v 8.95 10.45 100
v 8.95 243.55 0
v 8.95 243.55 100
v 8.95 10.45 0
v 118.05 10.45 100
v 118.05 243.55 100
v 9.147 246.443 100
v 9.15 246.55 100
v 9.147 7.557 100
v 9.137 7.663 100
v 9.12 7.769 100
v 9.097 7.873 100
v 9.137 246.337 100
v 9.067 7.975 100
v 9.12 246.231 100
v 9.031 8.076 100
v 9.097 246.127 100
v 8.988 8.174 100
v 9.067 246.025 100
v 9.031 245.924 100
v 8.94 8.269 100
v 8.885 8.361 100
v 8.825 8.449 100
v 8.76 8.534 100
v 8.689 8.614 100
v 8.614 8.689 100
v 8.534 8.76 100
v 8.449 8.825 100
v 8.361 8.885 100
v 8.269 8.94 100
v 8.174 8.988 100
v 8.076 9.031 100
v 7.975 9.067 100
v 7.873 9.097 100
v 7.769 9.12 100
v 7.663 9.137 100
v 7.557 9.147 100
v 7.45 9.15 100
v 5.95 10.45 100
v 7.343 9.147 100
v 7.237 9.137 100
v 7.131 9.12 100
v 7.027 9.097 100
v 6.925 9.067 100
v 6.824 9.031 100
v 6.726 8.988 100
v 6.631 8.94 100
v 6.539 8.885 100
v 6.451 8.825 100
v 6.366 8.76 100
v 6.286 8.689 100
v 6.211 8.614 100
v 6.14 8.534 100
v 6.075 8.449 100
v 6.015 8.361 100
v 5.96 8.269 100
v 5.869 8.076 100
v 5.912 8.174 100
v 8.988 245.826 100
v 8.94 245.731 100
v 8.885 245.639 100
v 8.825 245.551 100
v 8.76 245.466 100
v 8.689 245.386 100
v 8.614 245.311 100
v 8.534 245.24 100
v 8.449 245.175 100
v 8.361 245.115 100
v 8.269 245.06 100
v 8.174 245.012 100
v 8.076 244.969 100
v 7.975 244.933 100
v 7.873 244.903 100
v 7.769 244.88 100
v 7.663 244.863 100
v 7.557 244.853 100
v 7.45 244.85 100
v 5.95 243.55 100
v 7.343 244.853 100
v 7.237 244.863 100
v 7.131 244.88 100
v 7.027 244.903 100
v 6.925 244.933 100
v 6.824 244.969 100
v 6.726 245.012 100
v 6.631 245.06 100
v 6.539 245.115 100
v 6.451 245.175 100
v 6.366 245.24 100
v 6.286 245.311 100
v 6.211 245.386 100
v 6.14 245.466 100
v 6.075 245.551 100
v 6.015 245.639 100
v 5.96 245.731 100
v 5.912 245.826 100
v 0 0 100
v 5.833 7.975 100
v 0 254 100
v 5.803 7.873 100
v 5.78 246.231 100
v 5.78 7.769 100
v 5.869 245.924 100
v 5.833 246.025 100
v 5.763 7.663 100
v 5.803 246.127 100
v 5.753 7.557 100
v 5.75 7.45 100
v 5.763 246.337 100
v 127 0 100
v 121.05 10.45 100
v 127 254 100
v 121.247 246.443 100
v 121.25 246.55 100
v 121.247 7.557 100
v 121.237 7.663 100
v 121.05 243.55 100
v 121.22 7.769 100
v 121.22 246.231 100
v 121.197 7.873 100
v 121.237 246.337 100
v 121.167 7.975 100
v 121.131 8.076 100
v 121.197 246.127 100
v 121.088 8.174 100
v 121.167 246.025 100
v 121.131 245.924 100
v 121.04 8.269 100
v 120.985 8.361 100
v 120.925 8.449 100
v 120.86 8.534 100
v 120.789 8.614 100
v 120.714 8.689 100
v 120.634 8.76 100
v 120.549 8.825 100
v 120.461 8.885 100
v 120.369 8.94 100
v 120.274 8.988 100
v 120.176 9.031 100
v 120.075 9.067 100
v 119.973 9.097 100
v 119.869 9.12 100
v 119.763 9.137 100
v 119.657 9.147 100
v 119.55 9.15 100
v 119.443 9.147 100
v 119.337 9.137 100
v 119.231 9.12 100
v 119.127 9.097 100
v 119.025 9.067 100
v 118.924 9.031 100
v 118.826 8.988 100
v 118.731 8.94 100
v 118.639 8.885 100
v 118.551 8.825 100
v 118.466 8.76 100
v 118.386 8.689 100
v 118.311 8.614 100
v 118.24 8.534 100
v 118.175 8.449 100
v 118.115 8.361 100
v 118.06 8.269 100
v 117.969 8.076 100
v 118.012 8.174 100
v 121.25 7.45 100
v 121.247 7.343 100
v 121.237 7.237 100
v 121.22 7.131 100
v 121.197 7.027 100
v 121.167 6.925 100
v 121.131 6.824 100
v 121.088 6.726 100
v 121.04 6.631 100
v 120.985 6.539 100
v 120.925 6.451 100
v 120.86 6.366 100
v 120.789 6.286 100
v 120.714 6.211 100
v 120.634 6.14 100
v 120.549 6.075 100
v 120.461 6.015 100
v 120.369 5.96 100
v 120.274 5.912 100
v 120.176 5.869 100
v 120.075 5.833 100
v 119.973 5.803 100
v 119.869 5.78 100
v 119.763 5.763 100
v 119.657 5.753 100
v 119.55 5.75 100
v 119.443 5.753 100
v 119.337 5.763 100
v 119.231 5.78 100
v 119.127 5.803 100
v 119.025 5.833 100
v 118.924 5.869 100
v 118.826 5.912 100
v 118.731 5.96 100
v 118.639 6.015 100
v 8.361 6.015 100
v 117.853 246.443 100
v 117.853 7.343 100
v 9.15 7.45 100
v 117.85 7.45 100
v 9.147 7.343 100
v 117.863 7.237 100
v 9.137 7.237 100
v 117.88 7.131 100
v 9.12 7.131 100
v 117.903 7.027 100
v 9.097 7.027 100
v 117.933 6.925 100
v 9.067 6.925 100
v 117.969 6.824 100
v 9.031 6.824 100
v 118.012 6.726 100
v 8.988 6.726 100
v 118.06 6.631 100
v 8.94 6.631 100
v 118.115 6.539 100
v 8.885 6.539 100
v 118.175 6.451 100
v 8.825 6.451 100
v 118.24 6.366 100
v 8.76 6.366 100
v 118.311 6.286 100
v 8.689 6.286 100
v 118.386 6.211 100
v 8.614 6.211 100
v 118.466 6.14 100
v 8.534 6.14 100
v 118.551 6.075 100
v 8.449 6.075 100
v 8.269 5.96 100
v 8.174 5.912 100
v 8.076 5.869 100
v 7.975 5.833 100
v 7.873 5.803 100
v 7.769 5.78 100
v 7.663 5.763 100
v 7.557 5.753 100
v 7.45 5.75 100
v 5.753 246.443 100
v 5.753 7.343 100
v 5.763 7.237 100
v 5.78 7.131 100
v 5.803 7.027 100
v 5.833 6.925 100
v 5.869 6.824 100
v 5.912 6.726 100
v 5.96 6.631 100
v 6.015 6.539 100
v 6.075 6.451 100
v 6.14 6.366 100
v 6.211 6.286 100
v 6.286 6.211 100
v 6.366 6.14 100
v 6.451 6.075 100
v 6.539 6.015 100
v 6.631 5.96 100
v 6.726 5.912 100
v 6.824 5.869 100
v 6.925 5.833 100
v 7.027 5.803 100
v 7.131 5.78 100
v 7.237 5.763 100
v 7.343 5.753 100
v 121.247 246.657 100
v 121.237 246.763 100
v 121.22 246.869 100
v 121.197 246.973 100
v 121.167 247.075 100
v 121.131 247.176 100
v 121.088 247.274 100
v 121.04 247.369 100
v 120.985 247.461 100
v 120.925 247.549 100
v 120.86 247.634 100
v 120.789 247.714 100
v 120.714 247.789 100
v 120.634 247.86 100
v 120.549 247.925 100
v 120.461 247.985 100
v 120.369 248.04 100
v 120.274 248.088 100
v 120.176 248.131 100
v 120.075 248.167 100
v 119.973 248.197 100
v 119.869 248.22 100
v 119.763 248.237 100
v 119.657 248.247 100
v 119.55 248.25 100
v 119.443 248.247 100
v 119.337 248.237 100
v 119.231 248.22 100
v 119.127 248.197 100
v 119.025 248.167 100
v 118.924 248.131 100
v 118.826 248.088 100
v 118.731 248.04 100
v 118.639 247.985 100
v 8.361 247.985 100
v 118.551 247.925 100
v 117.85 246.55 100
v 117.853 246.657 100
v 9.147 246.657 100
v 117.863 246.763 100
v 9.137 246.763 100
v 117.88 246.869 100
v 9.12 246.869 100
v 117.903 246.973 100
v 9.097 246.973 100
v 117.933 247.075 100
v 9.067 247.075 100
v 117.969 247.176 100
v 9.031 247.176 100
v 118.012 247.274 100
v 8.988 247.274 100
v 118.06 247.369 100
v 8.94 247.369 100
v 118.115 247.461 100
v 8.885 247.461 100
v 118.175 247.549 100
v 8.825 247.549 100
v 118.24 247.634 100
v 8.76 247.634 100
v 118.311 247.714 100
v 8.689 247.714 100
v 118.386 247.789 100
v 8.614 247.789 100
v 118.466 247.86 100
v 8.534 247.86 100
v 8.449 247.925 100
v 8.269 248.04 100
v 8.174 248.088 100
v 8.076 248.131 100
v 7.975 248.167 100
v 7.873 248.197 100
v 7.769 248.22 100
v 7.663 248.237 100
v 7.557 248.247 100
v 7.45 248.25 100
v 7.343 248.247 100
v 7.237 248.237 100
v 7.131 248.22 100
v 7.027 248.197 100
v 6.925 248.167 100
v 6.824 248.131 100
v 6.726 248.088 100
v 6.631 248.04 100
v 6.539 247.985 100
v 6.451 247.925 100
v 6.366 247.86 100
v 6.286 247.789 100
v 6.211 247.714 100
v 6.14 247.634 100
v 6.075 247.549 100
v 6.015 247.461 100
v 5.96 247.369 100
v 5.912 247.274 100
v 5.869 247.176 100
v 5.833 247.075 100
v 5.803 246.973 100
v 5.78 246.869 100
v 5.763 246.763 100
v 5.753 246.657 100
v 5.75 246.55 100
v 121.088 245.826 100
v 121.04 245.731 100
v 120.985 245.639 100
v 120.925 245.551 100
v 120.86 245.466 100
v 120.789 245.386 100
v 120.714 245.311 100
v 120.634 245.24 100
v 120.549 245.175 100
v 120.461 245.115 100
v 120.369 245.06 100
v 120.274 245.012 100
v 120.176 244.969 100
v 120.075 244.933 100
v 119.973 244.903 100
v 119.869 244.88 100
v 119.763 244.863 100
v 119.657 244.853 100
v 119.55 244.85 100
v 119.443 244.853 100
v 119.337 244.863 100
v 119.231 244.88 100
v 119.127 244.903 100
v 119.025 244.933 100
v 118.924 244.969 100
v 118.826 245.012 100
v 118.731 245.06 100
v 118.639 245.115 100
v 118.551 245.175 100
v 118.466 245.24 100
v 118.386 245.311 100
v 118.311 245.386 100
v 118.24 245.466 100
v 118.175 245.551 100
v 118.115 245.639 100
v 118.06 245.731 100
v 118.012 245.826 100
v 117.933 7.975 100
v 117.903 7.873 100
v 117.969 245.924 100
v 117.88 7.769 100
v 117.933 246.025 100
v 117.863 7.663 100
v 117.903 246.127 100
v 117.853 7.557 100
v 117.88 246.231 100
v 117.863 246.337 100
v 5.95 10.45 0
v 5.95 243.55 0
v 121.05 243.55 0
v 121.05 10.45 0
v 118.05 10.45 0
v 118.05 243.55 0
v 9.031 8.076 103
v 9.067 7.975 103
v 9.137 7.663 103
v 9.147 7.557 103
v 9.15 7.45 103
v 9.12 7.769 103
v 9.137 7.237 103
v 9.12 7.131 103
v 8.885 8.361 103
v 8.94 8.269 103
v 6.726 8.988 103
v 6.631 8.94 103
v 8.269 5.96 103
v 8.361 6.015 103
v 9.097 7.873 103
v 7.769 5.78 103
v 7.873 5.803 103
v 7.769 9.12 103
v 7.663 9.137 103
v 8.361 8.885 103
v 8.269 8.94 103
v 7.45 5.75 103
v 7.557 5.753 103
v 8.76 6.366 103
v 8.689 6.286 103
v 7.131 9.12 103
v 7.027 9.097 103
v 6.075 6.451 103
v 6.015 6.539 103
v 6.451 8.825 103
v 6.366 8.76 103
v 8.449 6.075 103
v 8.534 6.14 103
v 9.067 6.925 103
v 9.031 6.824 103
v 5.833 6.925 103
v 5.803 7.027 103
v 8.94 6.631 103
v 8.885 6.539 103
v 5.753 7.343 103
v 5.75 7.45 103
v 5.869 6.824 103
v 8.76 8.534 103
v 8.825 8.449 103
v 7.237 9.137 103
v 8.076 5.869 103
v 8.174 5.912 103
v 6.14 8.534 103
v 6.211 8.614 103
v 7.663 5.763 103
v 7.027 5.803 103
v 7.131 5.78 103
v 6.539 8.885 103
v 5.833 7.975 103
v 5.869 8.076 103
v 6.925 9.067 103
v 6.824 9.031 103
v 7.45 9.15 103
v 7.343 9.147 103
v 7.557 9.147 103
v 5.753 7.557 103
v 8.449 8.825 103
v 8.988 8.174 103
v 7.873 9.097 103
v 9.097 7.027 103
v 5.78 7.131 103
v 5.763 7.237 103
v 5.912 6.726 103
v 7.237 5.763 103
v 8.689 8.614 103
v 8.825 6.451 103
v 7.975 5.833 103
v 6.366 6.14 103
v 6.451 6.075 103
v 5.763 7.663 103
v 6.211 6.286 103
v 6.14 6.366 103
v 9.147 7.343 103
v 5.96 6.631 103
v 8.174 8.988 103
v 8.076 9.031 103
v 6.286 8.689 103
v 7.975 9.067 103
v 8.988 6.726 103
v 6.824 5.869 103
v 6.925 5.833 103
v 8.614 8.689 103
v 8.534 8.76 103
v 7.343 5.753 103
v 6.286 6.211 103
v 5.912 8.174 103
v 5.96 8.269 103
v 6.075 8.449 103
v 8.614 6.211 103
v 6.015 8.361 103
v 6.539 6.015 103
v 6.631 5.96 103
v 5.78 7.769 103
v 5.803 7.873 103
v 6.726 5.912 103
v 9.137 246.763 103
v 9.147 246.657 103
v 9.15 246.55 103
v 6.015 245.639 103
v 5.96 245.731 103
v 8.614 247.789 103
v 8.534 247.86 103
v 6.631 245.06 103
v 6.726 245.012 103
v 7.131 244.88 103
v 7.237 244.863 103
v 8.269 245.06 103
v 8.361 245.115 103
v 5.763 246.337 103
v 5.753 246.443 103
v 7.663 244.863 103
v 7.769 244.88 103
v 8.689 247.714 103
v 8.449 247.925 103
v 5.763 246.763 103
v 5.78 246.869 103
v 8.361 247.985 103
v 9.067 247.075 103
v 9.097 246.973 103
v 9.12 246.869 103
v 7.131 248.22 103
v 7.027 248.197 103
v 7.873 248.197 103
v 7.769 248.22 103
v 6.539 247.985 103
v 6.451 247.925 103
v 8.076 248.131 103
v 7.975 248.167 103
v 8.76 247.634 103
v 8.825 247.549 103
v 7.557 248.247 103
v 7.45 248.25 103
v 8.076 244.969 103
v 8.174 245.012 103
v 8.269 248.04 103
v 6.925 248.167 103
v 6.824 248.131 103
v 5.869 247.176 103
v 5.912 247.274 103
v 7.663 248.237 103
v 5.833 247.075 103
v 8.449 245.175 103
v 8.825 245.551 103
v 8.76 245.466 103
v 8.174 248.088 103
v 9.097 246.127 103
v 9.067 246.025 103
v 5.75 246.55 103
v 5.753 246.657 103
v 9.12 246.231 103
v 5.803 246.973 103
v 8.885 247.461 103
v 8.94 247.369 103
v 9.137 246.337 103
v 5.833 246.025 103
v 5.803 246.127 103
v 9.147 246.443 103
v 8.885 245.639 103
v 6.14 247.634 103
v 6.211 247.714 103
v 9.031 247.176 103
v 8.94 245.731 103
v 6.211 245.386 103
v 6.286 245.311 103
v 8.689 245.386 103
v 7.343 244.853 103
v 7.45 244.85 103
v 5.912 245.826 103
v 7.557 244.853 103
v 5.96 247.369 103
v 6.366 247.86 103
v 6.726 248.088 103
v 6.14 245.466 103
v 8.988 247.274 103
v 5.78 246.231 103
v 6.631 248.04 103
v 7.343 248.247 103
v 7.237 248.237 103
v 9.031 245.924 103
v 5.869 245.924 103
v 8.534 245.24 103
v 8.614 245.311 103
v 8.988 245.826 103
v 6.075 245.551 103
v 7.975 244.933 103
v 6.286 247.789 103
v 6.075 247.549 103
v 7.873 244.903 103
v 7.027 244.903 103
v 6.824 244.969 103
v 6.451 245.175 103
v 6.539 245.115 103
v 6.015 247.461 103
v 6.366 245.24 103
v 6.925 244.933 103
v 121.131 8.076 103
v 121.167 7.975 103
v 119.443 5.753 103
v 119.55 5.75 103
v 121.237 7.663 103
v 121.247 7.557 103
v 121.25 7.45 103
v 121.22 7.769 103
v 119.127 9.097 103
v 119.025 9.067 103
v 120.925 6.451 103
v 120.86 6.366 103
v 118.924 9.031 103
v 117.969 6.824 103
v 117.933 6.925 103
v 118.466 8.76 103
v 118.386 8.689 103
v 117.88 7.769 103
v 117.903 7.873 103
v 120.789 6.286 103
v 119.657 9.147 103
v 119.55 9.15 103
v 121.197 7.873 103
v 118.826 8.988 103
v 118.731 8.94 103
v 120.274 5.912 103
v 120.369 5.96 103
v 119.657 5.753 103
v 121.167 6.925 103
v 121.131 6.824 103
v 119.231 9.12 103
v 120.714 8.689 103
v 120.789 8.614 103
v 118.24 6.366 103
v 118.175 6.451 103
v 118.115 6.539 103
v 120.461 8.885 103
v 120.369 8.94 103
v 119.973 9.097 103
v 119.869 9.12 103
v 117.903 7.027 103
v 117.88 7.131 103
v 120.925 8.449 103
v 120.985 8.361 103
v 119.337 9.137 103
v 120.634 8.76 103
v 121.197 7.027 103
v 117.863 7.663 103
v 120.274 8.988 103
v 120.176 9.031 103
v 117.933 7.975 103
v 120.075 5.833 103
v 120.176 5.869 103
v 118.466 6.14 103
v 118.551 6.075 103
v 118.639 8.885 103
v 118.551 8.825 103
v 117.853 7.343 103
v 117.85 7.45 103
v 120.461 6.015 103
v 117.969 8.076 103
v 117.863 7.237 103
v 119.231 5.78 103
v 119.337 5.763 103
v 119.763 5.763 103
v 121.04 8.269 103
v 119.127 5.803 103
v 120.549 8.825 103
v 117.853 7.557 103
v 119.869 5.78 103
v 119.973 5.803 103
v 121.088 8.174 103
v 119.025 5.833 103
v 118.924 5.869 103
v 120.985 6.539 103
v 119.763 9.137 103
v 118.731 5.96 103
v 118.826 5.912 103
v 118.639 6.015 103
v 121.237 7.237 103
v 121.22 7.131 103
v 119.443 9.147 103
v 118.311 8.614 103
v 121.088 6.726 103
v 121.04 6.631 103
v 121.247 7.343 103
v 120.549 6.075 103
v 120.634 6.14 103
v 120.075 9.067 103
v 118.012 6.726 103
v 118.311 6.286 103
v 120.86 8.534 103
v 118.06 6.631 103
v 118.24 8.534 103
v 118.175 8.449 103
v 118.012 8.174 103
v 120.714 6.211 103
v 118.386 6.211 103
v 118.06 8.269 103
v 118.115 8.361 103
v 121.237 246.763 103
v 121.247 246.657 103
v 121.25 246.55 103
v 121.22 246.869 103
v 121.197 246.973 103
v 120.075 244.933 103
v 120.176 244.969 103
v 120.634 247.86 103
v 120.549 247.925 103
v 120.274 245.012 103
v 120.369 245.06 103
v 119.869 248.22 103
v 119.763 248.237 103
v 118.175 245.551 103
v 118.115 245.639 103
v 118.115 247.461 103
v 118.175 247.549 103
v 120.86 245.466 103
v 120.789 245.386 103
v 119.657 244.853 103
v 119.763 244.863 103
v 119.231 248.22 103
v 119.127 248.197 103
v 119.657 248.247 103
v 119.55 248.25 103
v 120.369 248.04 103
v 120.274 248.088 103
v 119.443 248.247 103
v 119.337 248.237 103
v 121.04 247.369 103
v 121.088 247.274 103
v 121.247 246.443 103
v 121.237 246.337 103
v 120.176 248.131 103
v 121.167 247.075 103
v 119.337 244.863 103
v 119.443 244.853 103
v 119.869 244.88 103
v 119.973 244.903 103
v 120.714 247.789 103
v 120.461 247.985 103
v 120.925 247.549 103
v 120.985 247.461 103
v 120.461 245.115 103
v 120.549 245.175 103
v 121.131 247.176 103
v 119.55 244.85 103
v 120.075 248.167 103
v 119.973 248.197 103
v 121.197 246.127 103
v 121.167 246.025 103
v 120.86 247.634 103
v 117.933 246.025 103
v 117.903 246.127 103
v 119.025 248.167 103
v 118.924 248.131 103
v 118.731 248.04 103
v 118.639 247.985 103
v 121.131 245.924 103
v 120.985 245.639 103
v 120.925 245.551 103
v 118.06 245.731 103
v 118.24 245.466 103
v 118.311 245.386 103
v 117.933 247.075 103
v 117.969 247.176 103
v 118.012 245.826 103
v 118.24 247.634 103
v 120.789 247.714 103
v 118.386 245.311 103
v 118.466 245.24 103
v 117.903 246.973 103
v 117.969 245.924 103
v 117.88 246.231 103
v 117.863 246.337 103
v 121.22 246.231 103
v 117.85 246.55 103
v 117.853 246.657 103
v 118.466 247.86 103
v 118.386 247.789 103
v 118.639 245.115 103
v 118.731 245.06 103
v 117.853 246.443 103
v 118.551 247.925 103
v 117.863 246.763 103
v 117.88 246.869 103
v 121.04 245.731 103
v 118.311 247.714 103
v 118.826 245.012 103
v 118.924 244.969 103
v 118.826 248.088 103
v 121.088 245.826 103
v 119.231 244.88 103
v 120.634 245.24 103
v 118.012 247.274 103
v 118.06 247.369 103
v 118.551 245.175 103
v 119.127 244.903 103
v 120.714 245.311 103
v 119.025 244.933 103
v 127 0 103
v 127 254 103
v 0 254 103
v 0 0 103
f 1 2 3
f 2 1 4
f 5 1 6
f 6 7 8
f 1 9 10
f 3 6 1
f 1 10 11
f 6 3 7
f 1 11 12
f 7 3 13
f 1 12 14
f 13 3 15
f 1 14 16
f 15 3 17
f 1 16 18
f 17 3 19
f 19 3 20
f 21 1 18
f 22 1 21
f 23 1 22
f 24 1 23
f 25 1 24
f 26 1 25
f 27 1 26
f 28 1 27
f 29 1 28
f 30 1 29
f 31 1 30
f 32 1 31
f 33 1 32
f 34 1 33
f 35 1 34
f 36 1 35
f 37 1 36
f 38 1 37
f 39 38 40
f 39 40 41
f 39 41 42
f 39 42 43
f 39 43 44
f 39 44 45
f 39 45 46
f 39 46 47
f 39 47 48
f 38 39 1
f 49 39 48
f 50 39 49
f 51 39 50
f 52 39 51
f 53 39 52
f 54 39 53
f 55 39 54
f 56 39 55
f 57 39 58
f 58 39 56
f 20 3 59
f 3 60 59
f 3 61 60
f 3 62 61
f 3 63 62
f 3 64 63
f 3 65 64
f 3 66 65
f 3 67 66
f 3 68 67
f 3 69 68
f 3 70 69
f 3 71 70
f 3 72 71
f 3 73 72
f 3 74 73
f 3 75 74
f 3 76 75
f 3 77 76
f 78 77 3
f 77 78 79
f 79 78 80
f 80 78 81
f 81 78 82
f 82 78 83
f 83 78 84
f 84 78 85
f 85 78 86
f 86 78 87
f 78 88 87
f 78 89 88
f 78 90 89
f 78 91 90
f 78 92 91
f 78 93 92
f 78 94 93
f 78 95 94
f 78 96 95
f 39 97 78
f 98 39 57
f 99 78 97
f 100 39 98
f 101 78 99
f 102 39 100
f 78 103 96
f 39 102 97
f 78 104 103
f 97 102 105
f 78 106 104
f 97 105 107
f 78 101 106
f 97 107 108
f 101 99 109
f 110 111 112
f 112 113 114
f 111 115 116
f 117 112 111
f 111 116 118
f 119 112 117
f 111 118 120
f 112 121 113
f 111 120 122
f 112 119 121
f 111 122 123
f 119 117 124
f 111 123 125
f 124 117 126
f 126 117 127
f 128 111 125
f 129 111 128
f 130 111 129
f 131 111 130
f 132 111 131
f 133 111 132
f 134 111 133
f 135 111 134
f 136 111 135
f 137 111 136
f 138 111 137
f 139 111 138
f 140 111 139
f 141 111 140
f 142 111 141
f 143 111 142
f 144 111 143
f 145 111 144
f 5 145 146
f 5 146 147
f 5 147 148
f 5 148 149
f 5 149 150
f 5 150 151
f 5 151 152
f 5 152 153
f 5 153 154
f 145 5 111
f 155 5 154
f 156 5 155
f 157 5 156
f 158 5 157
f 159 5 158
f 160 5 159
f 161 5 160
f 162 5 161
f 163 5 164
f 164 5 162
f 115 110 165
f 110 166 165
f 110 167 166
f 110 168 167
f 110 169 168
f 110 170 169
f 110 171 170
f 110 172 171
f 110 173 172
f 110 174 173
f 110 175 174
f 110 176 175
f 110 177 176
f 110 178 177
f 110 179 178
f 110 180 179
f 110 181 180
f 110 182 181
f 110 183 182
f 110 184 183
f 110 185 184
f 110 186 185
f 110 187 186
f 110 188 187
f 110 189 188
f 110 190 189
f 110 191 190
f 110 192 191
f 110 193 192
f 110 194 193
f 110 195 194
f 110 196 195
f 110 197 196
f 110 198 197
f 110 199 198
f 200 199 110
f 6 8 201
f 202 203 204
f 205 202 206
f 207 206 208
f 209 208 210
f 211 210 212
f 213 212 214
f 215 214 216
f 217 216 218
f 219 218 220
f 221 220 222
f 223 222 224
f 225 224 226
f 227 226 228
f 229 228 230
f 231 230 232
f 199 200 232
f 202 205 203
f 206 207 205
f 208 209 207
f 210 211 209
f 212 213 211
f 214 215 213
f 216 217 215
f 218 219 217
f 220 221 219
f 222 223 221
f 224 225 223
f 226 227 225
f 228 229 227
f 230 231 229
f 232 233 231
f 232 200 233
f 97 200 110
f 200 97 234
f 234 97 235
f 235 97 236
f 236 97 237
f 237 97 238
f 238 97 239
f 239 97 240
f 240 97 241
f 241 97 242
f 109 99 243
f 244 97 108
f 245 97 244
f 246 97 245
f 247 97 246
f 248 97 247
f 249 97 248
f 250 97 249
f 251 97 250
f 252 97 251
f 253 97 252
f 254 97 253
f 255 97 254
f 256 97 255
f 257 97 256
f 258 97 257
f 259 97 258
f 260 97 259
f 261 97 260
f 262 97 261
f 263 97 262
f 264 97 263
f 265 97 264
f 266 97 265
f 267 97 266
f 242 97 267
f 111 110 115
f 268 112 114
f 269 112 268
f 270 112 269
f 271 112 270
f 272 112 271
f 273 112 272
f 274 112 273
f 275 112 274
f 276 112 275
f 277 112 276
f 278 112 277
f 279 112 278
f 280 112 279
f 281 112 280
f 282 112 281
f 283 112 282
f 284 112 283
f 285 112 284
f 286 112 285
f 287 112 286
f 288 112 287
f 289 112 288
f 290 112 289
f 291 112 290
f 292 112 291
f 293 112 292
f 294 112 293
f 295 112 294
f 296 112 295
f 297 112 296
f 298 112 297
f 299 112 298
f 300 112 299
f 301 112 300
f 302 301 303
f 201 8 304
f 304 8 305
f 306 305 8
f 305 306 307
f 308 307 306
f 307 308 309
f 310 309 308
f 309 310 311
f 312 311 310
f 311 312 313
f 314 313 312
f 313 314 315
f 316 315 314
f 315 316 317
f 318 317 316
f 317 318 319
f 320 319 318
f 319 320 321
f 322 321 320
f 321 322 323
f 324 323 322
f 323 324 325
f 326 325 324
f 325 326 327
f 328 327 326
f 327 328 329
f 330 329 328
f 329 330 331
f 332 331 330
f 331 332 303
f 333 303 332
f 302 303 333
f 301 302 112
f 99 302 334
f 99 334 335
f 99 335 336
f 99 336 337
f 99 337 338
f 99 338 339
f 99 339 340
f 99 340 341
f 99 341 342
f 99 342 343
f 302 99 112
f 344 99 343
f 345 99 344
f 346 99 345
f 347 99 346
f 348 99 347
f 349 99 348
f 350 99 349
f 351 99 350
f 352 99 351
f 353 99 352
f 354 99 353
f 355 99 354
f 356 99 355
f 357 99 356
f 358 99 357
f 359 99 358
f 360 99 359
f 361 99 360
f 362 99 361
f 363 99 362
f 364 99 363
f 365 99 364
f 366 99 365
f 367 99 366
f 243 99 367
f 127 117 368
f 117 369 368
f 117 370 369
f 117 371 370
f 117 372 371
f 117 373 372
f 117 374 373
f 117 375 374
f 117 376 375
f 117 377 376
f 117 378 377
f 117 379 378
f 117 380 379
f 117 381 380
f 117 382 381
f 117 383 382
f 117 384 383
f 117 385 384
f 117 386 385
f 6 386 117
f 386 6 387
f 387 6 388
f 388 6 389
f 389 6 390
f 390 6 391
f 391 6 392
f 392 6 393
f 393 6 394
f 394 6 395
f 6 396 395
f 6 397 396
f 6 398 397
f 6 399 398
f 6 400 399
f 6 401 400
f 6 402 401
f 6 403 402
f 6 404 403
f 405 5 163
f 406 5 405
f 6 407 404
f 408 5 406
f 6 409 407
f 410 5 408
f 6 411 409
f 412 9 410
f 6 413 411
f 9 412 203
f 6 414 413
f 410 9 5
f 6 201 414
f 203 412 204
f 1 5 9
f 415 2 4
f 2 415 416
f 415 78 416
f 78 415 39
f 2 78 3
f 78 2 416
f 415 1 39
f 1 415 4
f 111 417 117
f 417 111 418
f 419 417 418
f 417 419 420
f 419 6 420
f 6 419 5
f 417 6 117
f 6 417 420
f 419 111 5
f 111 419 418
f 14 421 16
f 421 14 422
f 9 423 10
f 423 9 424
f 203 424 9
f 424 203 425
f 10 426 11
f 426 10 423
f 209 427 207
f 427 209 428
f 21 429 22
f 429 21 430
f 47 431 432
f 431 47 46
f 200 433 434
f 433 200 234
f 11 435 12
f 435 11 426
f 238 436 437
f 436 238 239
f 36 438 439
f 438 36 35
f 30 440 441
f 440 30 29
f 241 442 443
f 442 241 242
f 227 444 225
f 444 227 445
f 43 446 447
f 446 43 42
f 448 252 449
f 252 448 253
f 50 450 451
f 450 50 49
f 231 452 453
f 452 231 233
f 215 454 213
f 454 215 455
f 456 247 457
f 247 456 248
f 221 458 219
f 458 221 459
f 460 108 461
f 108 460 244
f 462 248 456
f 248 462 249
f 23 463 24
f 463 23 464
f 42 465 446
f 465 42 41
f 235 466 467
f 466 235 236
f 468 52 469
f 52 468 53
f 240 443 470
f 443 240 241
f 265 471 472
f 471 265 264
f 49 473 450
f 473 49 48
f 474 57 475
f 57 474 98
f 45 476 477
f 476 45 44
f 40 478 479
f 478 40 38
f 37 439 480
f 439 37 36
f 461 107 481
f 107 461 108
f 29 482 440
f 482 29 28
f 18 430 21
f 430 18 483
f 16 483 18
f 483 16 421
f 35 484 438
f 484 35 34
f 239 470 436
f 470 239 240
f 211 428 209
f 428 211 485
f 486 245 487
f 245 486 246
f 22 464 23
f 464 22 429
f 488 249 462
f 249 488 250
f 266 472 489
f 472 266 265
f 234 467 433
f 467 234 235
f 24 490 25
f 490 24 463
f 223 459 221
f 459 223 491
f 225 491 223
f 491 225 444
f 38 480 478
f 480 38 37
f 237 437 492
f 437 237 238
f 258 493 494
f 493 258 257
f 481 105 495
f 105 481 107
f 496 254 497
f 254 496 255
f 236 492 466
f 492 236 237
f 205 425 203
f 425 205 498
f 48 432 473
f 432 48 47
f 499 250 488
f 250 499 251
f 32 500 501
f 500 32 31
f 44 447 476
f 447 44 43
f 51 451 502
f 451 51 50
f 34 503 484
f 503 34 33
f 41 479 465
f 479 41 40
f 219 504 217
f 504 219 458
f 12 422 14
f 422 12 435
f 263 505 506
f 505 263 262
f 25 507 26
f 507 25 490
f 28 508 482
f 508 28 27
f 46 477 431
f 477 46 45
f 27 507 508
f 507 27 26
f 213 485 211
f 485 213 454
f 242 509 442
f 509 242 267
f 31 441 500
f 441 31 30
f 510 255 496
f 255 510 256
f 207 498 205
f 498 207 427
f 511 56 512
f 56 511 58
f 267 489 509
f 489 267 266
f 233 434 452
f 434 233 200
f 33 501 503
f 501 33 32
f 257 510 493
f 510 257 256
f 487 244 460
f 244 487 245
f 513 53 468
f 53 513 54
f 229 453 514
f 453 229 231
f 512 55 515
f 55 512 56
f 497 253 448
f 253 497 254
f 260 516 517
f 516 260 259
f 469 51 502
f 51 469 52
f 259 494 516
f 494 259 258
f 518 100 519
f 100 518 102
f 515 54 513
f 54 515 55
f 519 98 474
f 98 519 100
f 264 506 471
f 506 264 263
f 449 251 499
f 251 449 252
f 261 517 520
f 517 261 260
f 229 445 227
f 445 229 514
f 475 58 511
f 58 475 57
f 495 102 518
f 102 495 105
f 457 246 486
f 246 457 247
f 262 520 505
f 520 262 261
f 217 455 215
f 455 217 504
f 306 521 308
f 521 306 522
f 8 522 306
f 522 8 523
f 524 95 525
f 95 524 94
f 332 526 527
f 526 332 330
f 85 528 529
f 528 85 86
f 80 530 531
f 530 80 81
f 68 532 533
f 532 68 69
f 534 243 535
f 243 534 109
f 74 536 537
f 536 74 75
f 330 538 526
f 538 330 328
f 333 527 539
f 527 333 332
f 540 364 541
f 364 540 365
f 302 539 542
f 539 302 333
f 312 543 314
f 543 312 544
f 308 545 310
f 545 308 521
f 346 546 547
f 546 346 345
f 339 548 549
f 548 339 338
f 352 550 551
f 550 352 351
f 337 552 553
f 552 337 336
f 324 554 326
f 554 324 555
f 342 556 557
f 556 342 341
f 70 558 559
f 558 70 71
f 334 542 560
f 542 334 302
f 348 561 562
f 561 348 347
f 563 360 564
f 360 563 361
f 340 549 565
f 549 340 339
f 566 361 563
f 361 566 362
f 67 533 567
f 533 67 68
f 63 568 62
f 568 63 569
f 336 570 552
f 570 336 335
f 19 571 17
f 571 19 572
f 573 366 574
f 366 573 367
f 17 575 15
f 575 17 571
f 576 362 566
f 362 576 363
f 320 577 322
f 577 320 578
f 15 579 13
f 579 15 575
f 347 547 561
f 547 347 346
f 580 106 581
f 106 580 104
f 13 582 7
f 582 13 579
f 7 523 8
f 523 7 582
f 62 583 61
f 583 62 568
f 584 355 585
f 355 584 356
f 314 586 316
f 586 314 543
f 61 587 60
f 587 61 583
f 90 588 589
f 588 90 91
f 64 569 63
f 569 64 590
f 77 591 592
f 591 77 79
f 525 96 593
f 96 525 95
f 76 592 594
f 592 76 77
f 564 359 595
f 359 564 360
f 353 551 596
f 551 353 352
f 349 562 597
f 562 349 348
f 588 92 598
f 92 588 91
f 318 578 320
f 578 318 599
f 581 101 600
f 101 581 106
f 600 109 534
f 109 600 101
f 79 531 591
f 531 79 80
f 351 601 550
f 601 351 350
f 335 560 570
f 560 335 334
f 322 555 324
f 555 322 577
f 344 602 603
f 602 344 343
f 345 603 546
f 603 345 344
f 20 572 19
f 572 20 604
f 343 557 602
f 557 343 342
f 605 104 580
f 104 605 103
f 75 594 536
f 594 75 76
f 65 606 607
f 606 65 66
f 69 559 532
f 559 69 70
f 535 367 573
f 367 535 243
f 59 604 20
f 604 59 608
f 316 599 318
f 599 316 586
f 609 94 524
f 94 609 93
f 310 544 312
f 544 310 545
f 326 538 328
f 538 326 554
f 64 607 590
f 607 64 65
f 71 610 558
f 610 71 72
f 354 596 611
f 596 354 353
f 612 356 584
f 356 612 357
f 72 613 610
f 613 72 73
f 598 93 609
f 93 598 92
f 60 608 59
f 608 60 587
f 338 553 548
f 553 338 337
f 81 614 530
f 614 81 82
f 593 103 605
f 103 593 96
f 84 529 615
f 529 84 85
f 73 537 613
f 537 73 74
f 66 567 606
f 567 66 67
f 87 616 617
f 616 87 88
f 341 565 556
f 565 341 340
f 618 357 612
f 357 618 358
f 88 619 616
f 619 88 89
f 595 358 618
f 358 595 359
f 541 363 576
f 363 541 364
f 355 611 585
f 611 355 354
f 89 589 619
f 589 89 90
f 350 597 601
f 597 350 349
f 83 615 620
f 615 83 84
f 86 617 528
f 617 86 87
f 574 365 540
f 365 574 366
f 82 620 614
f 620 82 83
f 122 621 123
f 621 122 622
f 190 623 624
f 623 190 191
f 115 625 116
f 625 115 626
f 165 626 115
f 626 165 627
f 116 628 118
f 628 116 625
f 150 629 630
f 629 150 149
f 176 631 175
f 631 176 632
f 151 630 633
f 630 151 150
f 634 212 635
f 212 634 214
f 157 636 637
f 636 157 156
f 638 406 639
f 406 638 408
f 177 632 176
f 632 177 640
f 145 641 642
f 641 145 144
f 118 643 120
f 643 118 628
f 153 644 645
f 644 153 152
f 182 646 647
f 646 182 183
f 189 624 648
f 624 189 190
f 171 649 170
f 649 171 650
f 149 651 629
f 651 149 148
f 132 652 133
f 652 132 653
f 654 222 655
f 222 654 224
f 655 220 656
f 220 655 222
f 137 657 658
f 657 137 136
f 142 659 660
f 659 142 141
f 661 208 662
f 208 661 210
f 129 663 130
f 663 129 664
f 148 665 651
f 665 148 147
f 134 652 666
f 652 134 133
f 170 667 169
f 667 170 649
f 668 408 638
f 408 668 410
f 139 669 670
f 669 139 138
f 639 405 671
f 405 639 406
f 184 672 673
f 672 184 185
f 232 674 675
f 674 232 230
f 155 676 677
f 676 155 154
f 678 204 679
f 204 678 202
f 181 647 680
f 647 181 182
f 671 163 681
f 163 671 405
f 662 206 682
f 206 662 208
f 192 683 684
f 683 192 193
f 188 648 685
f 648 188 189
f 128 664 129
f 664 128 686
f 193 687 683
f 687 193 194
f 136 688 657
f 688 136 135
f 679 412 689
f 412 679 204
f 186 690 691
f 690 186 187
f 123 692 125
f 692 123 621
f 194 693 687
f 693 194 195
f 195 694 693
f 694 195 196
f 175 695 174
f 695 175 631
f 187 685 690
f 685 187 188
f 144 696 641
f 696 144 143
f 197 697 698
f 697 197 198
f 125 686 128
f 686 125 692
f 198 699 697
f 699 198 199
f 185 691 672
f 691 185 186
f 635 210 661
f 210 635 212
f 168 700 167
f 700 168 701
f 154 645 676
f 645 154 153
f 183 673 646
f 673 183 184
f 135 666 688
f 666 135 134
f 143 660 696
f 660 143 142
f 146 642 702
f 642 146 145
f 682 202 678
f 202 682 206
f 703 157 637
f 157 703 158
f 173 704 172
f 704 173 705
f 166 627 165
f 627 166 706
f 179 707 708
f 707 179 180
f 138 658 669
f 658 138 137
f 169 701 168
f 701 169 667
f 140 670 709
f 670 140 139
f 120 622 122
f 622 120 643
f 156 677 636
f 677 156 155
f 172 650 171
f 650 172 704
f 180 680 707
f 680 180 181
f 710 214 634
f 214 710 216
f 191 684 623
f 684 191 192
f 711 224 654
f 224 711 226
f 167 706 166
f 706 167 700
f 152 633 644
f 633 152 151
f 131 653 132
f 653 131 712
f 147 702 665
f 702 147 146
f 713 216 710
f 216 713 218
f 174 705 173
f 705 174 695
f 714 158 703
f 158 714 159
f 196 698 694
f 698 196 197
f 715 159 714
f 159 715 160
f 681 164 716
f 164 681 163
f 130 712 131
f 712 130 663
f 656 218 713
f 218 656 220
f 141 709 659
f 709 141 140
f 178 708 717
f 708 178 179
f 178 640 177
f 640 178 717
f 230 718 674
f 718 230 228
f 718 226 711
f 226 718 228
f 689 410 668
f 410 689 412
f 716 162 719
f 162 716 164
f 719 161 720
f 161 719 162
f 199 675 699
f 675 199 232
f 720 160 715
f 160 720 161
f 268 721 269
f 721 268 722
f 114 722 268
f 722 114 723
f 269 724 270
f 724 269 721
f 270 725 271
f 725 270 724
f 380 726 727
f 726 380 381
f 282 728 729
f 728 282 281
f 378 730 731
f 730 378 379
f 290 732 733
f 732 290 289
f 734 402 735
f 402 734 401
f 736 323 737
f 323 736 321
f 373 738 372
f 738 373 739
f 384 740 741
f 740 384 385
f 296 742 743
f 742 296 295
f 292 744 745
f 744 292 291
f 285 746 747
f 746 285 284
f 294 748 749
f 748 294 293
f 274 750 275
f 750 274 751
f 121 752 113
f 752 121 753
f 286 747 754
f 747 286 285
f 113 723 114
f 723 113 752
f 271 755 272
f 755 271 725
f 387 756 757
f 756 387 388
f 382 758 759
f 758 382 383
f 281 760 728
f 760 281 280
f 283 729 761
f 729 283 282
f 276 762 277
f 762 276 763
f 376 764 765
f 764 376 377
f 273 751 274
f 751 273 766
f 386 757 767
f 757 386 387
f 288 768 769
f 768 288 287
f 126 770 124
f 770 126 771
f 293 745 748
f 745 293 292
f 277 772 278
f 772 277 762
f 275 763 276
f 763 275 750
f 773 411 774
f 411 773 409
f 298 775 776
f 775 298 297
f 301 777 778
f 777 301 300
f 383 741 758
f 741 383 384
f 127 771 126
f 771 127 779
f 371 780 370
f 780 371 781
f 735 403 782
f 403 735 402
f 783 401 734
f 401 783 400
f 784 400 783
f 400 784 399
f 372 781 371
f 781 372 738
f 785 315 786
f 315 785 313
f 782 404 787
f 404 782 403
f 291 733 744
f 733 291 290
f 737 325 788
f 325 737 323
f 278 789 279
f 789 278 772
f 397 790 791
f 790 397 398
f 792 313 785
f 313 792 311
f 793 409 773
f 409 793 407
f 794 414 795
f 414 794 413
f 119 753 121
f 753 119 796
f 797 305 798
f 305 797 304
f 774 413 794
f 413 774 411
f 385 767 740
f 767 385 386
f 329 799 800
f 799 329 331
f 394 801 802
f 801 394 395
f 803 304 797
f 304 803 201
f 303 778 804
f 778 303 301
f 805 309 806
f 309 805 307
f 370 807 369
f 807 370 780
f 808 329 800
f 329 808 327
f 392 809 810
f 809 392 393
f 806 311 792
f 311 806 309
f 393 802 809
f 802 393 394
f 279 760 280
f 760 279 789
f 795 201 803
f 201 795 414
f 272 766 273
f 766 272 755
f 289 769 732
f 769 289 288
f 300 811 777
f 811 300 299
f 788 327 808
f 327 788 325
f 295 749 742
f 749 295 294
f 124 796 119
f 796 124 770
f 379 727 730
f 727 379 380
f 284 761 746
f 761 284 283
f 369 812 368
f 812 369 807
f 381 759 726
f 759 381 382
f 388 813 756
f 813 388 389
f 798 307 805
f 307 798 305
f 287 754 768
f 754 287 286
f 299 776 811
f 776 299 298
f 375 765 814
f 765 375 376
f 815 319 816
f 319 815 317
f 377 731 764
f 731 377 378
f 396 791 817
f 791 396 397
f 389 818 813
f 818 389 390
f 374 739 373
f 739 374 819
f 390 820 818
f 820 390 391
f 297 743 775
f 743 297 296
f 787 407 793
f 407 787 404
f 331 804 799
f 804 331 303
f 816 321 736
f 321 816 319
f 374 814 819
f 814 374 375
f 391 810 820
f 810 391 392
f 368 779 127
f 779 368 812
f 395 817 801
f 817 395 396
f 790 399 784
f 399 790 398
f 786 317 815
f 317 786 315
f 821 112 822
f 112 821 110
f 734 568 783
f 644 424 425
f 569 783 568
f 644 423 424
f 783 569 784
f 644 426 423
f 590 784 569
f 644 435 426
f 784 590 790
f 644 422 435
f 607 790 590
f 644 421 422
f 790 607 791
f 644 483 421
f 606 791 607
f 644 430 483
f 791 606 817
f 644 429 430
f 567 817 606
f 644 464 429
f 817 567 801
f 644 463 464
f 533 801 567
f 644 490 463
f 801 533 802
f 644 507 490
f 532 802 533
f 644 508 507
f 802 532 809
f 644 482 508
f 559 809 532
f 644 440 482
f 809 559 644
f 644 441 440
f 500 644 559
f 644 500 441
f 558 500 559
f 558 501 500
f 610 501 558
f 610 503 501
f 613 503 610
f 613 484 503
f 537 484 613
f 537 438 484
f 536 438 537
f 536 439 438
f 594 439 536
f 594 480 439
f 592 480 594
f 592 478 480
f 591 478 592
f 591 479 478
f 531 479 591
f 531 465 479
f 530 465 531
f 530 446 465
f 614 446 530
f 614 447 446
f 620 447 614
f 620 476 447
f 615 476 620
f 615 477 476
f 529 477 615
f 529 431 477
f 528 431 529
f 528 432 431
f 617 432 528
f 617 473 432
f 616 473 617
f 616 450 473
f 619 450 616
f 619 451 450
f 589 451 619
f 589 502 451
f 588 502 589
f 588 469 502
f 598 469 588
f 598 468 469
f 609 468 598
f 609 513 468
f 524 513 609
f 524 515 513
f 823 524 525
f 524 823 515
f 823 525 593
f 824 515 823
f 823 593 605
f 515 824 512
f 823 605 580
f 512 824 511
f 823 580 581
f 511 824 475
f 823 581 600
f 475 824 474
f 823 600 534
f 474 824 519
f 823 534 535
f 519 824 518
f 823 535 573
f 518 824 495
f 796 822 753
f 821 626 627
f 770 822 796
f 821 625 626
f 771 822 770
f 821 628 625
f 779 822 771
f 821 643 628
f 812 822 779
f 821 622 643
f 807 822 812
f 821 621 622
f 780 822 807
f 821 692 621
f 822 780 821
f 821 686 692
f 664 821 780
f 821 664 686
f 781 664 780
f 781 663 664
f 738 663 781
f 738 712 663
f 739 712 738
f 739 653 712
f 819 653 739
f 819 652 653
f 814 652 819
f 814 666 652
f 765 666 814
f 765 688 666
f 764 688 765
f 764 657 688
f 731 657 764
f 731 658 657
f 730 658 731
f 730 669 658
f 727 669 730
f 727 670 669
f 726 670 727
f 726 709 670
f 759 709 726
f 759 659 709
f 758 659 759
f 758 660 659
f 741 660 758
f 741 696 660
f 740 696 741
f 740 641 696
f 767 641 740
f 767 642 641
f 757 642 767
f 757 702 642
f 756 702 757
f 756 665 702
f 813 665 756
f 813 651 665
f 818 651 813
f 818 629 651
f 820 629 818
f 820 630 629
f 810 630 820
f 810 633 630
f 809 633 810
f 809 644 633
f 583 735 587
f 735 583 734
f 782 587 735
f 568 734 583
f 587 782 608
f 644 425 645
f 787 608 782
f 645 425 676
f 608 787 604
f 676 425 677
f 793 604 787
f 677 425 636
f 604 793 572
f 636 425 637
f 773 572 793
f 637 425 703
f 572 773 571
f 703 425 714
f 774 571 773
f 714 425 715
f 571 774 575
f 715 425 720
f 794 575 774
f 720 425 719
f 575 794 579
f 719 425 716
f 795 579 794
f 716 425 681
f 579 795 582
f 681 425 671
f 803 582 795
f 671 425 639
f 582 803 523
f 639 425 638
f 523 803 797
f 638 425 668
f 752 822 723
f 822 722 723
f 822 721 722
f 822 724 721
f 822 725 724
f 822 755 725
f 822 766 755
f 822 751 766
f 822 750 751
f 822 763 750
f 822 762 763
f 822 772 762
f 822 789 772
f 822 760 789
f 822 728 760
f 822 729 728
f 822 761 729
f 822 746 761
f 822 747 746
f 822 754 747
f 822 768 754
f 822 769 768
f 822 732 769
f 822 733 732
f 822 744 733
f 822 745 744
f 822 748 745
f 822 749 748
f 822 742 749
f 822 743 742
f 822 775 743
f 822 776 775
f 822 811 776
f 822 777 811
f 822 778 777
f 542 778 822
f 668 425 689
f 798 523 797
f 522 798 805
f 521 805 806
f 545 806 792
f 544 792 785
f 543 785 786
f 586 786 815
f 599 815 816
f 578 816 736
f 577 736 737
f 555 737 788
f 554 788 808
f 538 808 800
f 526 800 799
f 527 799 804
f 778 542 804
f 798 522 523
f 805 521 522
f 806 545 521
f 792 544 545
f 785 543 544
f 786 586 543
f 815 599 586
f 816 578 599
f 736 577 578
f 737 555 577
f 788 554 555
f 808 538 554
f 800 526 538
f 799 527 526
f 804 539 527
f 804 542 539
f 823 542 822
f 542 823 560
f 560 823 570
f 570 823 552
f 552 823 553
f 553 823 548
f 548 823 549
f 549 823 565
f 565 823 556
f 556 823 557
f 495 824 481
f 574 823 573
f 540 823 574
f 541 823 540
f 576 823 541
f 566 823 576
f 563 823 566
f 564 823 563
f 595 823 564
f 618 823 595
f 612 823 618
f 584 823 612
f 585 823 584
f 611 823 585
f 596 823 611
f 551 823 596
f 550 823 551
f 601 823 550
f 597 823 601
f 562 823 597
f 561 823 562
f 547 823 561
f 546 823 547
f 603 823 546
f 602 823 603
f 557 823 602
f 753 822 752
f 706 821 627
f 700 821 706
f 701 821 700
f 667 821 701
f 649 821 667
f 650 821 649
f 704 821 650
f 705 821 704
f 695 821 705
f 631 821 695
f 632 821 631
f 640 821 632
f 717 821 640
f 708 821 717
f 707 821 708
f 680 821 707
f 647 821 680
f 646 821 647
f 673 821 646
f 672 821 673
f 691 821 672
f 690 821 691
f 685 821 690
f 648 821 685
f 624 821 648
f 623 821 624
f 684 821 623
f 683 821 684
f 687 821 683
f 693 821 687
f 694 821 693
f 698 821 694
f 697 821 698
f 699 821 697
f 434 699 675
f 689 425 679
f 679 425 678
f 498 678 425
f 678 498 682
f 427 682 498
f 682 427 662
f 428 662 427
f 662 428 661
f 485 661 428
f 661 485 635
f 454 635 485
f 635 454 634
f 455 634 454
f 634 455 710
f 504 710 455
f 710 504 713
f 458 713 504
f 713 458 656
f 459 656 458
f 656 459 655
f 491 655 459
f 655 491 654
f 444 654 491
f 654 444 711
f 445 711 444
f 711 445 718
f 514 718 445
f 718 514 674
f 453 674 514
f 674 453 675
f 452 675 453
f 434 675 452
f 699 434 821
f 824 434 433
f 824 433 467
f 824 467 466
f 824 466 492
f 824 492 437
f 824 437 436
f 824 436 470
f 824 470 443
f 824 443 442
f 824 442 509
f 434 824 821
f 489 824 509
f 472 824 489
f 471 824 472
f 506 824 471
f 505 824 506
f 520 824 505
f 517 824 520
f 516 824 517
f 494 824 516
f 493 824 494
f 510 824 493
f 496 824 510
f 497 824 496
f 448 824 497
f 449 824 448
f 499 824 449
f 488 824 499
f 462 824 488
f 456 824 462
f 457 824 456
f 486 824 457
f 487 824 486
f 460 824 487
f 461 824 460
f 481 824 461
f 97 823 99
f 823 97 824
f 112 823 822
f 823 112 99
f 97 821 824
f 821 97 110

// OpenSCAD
// file: constants.scad
inch=25.4;


length = 5*inch;
height = 100;
width=10*inch;
base_height = 0.125*inch;
wall_thickness = 3;
through_4_40 = 3.26;
through_3_mm = 3.4;
$fn=100;

extrusion_width = 14.9;
// main file
include <constants.scad>

module clear_panels(){
    color("#ffffff22"){
        for (x=[extrusion_width/2, length-extrusion_width/2])
            translate([x, width/2, height/2])
            {
                cube([wall_thickness, width-extrusion_width-6, height], center=true);
                echo("Clear plastic wall:", width-extrusion_width-6, height, "mm");
                echo("Equivalent to wall:", (width-extrusion_width-6)/inch, height/inch, "in");
            }
        translate([length/2, width/2, height+wall_thickness/2])
        {
            difference(){
                cube([length, width, wall_thickness], center=true);
                echo("Clear plastic wall:", length, width, "mm");
                echo("Equivalent to wall:", length/inch, width/inch, "in");
                echo("With holes for 3mm screws in corners", extrusion_width/2, "mm = ", extrusion_width/2/inch, "in, square from each corner");
                for (x=[-length/2 + extrusion_width/2, length/2 - extrusion_width/2])
                    for(y=[-width/2 + extrusion_width/2, width/2 - extrusion_width/2])
                        translate([x,y])
                        cylinder(d=through_3_mm, h=wall_thickness*2, center=true);
            }
        }
    }
}

clear_panels();
